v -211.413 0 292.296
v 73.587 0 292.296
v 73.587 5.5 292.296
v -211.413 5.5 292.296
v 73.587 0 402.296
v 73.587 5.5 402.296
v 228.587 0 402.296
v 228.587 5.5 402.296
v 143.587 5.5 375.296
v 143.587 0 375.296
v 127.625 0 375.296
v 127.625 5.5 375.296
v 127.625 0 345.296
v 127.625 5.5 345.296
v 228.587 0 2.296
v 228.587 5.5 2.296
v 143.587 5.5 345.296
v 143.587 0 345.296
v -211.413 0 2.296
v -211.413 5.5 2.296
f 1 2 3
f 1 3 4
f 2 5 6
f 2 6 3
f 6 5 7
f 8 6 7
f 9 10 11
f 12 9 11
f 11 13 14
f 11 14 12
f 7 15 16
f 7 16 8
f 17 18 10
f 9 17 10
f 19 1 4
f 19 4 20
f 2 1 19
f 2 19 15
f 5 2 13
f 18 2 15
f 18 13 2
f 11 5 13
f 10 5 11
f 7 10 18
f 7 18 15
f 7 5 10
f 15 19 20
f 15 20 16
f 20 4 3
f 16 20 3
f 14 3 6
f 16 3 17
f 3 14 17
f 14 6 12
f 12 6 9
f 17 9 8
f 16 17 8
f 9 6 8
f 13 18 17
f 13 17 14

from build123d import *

# Parameters (mm, degrees)
CROQUIS1_W              = 15.961432879
CROQUIS1_H              = 30
SALIENTE_EXTRUIR1_DEPTH = 5.5


with BuildPart() as part:
    # Croquis1 → Saliente-Extruir1 (new body)
    with BuildSketch(Plane(origin=(0, 0, 0), x_dir=(-1, 0, 0), z_dir=(0, 1, 0))):
        Polygon((-73.586706802, 402.295789036), (-73.586706802, 292.295789036), (211.413293198, 292.295789036), (211.413293198, 2.295789036), (-228.586706802, 2.295789036), (-228.586706802, 402.295789036), (-143.586706802, 402.295789036), align=None)
        with Locations((-135.605990362, 360.295789036)):
            Rectangle(CROQUIS1_W, CROQUIS1_H, mode=Mode.SUBTRACT)
    extrude(amount=SALIENTE_EXTRUIR1_DEPTH)


solid = part.part
